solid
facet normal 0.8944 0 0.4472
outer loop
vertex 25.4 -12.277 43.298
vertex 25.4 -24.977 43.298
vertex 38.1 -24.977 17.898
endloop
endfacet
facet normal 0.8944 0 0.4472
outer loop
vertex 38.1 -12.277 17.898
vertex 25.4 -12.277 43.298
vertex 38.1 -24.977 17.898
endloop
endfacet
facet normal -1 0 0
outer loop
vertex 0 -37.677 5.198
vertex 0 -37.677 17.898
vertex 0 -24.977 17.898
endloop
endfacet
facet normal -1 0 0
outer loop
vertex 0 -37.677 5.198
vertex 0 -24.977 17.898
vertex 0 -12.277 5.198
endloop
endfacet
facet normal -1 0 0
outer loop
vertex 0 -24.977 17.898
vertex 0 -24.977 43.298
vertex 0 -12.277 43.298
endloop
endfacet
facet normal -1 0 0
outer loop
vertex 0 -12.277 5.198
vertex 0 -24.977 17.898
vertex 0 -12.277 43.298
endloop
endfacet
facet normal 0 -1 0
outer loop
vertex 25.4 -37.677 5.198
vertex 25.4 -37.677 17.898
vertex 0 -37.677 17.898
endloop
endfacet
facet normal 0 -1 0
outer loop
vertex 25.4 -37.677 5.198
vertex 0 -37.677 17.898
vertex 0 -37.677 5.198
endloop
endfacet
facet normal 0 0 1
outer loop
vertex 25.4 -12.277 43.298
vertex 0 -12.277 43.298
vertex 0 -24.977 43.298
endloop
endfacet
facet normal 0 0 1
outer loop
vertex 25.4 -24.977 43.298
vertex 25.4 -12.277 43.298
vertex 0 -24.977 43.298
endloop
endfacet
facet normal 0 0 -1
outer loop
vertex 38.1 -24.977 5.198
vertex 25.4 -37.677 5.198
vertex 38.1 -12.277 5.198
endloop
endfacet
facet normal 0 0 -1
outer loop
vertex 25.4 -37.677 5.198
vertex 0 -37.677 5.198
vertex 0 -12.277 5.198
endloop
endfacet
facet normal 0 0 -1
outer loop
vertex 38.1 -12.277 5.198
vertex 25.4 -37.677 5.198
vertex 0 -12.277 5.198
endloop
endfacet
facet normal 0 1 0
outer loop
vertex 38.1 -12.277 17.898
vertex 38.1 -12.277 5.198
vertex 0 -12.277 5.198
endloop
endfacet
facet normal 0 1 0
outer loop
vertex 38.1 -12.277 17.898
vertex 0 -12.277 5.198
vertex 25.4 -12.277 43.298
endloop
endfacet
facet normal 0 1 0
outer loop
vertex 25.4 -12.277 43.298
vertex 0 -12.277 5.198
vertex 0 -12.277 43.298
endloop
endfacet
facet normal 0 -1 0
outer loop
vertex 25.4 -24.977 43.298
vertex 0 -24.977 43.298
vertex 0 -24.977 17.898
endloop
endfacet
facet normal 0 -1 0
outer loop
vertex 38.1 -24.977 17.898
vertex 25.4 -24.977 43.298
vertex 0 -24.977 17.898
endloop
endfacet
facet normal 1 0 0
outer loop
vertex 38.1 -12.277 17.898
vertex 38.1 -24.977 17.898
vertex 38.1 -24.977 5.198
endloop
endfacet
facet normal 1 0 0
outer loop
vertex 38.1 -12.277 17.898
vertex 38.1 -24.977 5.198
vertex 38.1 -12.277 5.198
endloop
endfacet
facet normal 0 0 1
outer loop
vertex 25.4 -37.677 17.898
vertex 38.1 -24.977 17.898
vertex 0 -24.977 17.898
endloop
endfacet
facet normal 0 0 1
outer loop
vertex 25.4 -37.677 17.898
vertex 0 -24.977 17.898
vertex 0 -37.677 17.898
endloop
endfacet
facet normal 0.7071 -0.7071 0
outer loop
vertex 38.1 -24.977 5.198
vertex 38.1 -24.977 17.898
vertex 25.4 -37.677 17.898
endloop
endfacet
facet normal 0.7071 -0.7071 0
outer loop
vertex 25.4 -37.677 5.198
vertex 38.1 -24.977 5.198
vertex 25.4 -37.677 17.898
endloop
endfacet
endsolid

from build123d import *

# Parameters (mm, degrees)
F1_DEPTH = 38.1
F3_DEPTH = 25.4
F5_DEPTH = 25.4


with BuildPart() as f1:
    # F0 (on Right) → F1 (new body)
    with BuildSketch(Plane.YZ):
        Polygon((-12.276925, 5.197683), (-12.276925, 43.297683), (-24.976925, 43.297683), (-24.976925, 17.897683), (-37.676925, 17.897683), (-37.676925, 5.197683), align=None)
    extrude(amount=F1_DEPTH)

    # F2 (on face) → F3 (cut)
    with BuildSketch(Plane.XZ.offset(24.976925)):
        Polygon((38.1, 43.297683), (25.4, 43.297683), (38.1, 17.897683), align=None)
    extrude(amount=-F3_DEPTH, mode=Mode.SUBTRACT)

    # F4 (on face) → F5 (cut)
    with BuildSketch(Plane.XY.offset(17.897683)):
        Polygon((38.1, -37.676925), (38.1, -24.976925), (25.4, -37.676925), align=None)
    extrude(amount=-F5_DEPTH, mode=Mode.SUBTRACT)


solid = f1.part
